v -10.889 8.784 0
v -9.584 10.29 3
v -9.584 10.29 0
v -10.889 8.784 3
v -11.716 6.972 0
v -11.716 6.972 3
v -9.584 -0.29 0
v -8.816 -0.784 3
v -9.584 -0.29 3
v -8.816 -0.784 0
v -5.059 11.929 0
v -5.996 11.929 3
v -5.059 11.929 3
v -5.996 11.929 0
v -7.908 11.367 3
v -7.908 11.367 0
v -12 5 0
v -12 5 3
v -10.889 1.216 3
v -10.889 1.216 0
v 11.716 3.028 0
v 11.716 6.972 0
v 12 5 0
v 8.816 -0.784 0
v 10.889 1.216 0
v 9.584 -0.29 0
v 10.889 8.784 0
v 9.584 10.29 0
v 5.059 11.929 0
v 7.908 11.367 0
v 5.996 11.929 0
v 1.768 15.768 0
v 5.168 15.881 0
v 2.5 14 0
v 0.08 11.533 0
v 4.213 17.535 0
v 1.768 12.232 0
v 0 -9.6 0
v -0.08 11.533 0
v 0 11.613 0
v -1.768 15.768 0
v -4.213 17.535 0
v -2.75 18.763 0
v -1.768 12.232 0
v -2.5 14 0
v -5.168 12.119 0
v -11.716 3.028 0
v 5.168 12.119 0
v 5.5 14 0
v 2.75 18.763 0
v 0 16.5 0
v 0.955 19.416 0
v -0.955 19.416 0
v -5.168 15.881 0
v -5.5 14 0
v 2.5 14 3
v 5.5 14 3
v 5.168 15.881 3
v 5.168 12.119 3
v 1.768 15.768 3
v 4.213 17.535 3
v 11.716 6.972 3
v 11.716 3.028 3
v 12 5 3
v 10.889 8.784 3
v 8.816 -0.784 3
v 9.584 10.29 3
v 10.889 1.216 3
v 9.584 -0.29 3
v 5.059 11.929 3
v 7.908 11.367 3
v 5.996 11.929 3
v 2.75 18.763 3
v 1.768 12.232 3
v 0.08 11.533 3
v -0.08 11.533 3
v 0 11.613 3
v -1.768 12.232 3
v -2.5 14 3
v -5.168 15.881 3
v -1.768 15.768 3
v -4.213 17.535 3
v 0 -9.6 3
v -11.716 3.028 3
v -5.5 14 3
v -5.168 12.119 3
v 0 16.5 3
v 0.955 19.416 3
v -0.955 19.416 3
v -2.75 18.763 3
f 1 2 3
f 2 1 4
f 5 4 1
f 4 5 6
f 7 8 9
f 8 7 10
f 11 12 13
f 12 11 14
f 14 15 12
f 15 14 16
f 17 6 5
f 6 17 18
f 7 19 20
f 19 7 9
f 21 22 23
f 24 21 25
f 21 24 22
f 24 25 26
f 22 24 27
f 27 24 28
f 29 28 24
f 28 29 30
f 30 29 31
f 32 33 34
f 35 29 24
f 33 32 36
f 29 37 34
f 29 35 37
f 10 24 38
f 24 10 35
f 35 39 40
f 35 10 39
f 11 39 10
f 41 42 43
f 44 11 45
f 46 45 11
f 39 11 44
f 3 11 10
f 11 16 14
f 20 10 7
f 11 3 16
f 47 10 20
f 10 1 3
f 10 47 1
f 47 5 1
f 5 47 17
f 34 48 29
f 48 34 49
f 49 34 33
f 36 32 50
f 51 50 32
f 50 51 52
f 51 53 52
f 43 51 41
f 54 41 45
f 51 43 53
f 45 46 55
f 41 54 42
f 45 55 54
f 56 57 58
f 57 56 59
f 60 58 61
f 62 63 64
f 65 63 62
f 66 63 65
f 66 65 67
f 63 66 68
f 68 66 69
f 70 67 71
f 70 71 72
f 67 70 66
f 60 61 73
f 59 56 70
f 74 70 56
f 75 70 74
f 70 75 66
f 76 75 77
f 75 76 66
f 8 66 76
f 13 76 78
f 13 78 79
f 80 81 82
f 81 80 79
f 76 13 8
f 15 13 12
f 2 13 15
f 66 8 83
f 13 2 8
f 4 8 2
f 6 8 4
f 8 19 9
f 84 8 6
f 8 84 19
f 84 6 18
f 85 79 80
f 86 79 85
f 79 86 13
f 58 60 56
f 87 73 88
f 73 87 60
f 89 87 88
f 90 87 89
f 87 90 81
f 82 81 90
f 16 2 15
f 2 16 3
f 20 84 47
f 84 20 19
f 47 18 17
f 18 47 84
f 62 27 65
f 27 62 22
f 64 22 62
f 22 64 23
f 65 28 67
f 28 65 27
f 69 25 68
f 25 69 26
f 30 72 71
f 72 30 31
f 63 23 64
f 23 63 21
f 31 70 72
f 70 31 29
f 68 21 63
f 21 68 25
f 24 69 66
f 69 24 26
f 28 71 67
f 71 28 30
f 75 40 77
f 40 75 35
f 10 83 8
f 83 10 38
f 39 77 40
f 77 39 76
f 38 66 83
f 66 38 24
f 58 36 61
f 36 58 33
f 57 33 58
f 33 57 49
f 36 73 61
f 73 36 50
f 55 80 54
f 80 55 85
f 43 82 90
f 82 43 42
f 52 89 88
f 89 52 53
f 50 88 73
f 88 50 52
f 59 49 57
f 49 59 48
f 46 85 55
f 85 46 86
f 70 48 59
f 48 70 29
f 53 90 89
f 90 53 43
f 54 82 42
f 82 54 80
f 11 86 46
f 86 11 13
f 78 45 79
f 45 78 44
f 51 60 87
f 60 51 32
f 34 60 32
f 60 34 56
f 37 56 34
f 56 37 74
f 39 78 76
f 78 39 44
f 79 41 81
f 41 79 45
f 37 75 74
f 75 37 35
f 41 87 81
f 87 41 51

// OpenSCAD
altura = 3;

module coracao_base_cubo() {
    union() {
        // As duas metades superiores (arredondadas para formar o topo do coração)
        translate([-5, 5, 0]) cylinder(h = altura, r = 7);
        translate([5, 5, 0]) cylinder(h = altura, r = 7);
        
        // O Bico: um cubo rodado a 45 graus para criar uma ponta geométrica
        translate([0, -9.60, 0]) 
        rotate([0, 0, 45]) 
        cube([15, 15, altura], center = false);
    }
}

// Junta a forma com a argola física
union() {
    coracao_base_cubo();
    
    // Argola integrada no topo (também com aspeto robusto)
    translate([0, 14, 0]) 
    difference() {
        cylinder(h = 3, r = 5.5);
        translate([0, 0, -1]) cylinder(h = altura + 2, r = 2.5);
    }
}
